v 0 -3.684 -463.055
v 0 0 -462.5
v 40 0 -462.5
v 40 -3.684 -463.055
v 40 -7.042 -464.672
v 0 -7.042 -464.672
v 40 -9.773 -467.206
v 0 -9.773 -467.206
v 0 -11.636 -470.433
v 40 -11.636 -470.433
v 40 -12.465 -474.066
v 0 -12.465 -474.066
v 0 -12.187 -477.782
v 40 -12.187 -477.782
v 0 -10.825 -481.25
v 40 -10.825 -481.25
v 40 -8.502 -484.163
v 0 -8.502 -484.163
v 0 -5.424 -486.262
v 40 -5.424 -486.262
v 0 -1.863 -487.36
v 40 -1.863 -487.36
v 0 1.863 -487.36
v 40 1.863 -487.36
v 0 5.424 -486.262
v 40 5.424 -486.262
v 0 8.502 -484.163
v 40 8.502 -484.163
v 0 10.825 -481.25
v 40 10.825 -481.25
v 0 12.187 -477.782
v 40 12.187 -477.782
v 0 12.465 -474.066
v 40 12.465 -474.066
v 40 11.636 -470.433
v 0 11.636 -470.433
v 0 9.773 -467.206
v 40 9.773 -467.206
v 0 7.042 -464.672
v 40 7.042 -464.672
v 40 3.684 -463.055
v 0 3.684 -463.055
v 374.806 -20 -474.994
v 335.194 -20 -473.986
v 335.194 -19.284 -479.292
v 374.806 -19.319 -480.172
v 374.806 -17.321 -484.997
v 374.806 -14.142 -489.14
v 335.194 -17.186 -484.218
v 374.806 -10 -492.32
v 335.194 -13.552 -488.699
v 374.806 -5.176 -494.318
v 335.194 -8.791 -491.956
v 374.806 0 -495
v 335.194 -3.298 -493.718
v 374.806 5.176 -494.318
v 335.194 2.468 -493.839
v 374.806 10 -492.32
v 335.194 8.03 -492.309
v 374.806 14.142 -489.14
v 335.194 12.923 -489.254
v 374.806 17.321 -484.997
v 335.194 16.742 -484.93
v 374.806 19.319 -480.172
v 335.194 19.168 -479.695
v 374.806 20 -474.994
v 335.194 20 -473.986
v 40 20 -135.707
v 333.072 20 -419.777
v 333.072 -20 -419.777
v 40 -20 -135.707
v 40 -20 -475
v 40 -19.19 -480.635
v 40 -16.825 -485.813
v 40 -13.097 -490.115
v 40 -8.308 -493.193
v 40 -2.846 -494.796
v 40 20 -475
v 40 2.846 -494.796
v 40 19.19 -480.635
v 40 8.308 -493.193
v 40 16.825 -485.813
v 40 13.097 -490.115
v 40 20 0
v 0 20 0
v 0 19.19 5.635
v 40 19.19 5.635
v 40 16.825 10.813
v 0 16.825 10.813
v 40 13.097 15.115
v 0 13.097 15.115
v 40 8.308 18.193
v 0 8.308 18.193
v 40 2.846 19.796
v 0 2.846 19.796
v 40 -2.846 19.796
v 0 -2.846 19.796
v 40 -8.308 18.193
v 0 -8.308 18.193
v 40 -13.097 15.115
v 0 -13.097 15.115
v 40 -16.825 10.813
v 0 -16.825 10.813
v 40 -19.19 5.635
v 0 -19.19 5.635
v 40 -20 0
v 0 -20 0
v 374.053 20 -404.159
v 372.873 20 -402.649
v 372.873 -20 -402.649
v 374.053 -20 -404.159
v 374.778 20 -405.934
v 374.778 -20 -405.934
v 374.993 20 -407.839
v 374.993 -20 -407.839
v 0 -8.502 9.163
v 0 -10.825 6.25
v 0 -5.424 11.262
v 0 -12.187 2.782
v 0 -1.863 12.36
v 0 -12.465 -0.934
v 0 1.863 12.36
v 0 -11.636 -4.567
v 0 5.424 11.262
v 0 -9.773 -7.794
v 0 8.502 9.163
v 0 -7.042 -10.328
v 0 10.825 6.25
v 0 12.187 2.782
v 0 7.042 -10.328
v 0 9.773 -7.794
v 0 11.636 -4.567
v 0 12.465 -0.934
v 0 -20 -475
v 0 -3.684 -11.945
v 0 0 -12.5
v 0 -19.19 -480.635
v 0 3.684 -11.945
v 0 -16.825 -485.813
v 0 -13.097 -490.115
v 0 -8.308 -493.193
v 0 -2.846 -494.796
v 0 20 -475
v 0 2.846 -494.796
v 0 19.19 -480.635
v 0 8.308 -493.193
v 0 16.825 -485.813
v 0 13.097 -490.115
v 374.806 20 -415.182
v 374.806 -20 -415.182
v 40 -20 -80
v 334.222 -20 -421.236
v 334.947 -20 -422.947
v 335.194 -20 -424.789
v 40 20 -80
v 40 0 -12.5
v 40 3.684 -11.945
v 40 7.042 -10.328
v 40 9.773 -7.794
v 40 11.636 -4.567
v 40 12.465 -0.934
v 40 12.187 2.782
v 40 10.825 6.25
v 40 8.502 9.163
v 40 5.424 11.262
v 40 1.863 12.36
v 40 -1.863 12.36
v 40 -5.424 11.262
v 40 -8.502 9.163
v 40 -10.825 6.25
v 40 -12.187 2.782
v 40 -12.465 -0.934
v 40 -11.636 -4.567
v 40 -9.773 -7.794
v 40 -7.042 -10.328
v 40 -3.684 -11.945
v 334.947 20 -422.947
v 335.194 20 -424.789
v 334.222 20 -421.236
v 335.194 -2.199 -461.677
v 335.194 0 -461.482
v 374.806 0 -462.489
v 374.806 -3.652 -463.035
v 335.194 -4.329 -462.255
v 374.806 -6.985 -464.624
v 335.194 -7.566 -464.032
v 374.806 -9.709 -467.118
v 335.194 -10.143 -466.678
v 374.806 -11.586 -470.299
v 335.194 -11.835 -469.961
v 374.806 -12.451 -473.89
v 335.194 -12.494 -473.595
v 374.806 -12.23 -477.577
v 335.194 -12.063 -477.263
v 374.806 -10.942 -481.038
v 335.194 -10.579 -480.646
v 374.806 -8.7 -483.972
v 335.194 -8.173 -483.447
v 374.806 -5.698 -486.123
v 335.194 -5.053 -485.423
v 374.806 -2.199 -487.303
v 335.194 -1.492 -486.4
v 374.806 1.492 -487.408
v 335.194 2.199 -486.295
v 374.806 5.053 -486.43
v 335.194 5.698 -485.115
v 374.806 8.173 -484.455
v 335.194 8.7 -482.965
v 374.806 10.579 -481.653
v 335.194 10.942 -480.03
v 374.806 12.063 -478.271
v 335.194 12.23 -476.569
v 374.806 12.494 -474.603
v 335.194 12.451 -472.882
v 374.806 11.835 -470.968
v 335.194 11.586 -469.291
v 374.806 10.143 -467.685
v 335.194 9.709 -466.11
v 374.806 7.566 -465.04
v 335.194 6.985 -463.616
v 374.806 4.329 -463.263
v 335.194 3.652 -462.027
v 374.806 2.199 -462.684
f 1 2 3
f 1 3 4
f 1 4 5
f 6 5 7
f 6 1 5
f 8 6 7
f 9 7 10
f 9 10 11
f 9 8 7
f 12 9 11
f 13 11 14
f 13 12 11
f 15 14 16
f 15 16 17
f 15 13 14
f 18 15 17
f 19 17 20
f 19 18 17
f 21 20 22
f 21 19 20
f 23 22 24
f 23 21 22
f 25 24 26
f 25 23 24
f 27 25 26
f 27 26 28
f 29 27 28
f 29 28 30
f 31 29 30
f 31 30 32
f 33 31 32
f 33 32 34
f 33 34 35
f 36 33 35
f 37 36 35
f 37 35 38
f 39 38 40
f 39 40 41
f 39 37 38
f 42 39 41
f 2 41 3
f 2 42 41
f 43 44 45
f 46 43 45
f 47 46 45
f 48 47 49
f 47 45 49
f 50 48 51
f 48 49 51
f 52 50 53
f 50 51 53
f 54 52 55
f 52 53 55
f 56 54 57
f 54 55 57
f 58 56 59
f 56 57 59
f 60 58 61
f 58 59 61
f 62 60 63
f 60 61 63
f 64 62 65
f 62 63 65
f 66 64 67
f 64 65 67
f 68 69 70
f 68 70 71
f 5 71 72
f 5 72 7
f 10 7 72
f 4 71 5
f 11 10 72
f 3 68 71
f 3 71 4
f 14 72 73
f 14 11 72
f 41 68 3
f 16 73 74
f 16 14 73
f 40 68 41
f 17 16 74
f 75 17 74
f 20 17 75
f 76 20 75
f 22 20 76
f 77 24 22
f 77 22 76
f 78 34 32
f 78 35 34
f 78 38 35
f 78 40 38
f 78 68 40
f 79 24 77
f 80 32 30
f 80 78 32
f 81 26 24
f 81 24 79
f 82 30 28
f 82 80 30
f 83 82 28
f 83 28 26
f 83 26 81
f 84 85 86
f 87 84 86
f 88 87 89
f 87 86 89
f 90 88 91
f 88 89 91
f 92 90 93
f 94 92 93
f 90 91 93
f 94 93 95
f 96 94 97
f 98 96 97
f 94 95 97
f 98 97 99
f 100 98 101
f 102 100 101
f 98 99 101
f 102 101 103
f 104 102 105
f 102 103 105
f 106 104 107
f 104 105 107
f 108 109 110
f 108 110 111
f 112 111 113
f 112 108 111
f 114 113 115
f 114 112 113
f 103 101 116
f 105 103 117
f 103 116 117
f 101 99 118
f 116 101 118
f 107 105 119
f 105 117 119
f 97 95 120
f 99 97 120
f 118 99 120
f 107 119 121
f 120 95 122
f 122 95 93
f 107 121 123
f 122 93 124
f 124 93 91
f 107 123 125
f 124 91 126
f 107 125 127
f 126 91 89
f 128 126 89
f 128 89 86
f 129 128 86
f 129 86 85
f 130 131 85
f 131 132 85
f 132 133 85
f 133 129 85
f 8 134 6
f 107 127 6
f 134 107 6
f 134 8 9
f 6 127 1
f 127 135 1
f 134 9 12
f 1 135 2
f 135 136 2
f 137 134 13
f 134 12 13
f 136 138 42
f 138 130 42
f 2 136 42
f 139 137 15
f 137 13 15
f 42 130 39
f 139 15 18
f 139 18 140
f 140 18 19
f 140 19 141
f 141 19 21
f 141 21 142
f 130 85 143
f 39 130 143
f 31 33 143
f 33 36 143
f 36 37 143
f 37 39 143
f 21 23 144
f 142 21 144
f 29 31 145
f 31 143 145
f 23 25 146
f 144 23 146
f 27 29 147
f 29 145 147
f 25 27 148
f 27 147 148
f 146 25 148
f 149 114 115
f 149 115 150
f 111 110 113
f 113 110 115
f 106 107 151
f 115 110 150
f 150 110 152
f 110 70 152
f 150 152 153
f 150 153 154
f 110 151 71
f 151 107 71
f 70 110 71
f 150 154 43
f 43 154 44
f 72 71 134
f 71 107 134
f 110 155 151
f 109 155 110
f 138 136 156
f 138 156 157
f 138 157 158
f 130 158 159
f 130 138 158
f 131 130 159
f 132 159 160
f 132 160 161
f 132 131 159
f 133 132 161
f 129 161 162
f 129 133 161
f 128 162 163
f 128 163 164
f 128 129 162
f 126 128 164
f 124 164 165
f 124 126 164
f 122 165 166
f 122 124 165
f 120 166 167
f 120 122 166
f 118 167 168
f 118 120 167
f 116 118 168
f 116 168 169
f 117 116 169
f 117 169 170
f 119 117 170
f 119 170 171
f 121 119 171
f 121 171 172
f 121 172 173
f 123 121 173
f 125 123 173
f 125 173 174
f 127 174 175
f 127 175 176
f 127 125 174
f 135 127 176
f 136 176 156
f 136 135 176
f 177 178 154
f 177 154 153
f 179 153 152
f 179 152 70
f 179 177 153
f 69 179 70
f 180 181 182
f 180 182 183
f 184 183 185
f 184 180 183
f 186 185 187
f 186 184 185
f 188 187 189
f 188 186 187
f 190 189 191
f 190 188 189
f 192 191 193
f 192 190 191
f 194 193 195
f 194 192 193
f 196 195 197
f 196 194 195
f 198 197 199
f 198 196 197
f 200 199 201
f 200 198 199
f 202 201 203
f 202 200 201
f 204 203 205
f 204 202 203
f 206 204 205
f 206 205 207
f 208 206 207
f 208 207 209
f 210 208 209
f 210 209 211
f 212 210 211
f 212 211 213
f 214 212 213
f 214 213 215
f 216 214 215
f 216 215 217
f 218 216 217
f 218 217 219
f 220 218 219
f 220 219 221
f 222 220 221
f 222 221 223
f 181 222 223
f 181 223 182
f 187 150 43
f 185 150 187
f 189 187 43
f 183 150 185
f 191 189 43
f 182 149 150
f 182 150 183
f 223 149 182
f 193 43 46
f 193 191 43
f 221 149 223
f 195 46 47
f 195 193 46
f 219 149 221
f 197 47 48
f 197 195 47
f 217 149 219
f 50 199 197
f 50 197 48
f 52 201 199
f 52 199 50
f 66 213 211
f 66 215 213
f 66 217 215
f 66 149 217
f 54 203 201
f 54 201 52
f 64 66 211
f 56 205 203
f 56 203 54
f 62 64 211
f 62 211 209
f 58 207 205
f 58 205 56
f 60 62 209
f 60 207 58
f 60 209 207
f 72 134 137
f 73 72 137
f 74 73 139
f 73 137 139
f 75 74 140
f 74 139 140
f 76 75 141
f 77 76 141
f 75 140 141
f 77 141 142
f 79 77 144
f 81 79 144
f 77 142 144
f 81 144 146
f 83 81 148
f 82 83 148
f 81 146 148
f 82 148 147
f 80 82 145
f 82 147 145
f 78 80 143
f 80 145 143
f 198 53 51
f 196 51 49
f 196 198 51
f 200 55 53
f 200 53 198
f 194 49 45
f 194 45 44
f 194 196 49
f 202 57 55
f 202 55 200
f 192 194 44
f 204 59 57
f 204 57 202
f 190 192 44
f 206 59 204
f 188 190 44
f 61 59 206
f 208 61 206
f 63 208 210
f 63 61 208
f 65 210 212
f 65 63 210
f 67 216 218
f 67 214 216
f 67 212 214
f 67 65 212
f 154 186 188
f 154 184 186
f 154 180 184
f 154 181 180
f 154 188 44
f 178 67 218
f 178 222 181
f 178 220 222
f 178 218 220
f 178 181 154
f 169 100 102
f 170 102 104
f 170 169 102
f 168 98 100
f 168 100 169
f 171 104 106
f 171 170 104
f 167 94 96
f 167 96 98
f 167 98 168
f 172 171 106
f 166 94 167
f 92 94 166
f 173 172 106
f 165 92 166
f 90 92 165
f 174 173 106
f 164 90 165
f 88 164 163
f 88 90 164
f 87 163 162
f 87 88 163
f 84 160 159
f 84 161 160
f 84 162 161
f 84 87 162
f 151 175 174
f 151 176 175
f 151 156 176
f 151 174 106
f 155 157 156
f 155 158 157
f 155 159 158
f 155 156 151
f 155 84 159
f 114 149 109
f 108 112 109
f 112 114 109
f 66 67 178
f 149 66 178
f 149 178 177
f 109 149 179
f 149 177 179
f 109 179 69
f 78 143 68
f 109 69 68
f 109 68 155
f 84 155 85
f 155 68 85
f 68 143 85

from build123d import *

# Parameters (mm, degrees)
CROQUIS1_R                 = 12.5
SALIENTE_EXTRUIR1_DEPTH    = 40
SALIENTE_EXTRUIR2_DEPTH    = 40
CORTAR_EXTRUIR2_DEPTH      = 45
CORTAR_EXTRUIR2_DEPTH_BACK = 45
CROQUIS3_R                 = 12.5


with BuildPart() as part:
    # Croquis1 → Saliente-Extruir1 (new body)
    with BuildSketch(Plane(origin=(0, 0, 0), x_dir=(0, 0, -1), z_dir=(1, 0, 0))):
        with BuildLine():
            ThreePointArc((0, 20), (-20, 0), (0, -20))
            Line((0, -20), (475, -20))
            ThreePointArc((475, -20), (495, 0), (475, 20))
            Line((475, 20), (0, 20))
        make_face()
        with Locations((475, 0)):
            Circle(CROQUIS1_R, mode=Mode.SUBTRACT)
        Circle(CROQUIS1_R, mode=Mode.SUBTRACT)
    extrude(amount=SALIENTE_EXTRUIR1_DEPTH)

    # Croquis2 → Saliente-Extruir2 (add)
    with BuildSketch(Plane(origin=(0, 20, 0), x_dir=(1, 0, 0), z_dir=(0, 1, 0))):
        with BuildLine():
            Line((40, 135.706571889), (40, 80))
            Line((40, 80), (372.872939005, 402.648821131))
            ThreePointArc((372.872939005, 402.648821131), (374.476832278, 405.021700465), (374.992889328, 407.83891808))
            Line((374.992889328, 407.83891808), (374.806076613, 415.181628683))
            Line((374.806076613, 415.181628683), (374.806076613, 495))
            Line((374.806076613, 495), (335.193923387, 495))
            Line((335.193923387, 495), (335.193923387, 462.022456719))
            Line((335.193923387, 462.022456719), (335.193923387, 424.789203994))
            ThreePointArc((335.193923387, 424.789203994), (334.64151447, 422.067558315), (333.071714854, 419.776654567))
            Line((333.071714854, 419.776654567), (40, 135.706571889))
        make_face()
    extrude(amount=-SALIENTE_EXTRUIR2_DEPTH)

    # Croquis3 → Cortar-Extruir2 (cut, two sides: drawn at the far end of the back side and taken through both)
    with BuildSketch(Plane(origin=(385.119812841, 0, -9.798190532), x_dir=(-0.025433697775531394, 0, -0.9996765111862251), z_dir=(0.9996765111862251, 0, -0.025433697775531394)).offset(-CORTAR_EXTRUIR2_DEPTH_BACK)):
        with Locations((465.30716856, 0)):
            Circle(CROQUIS3_R)
        with BuildLine():
            Line((465.30716856, 20), (485.30716856, 20))
            Line((485.30716856, 20), (531.151017537, 20))
            Line((531.151017537, 20), (531.151017537, -20))
            Line((531.151017537, -20), (485.30716856, -20))
            Line((485.30716856, -20), (465.30716856, -20))
            ThreePointArc((465.30716856, -20), (485.30716856, 0), (465.30716856, 20))
        make_face()
    extrude(amount=CORTAR_EXTRUIR2_DEPTH + CORTAR_EXTRUIR2_DEPTH_BACK, mode=Mode.SUBTRACT)


solid = part.part
